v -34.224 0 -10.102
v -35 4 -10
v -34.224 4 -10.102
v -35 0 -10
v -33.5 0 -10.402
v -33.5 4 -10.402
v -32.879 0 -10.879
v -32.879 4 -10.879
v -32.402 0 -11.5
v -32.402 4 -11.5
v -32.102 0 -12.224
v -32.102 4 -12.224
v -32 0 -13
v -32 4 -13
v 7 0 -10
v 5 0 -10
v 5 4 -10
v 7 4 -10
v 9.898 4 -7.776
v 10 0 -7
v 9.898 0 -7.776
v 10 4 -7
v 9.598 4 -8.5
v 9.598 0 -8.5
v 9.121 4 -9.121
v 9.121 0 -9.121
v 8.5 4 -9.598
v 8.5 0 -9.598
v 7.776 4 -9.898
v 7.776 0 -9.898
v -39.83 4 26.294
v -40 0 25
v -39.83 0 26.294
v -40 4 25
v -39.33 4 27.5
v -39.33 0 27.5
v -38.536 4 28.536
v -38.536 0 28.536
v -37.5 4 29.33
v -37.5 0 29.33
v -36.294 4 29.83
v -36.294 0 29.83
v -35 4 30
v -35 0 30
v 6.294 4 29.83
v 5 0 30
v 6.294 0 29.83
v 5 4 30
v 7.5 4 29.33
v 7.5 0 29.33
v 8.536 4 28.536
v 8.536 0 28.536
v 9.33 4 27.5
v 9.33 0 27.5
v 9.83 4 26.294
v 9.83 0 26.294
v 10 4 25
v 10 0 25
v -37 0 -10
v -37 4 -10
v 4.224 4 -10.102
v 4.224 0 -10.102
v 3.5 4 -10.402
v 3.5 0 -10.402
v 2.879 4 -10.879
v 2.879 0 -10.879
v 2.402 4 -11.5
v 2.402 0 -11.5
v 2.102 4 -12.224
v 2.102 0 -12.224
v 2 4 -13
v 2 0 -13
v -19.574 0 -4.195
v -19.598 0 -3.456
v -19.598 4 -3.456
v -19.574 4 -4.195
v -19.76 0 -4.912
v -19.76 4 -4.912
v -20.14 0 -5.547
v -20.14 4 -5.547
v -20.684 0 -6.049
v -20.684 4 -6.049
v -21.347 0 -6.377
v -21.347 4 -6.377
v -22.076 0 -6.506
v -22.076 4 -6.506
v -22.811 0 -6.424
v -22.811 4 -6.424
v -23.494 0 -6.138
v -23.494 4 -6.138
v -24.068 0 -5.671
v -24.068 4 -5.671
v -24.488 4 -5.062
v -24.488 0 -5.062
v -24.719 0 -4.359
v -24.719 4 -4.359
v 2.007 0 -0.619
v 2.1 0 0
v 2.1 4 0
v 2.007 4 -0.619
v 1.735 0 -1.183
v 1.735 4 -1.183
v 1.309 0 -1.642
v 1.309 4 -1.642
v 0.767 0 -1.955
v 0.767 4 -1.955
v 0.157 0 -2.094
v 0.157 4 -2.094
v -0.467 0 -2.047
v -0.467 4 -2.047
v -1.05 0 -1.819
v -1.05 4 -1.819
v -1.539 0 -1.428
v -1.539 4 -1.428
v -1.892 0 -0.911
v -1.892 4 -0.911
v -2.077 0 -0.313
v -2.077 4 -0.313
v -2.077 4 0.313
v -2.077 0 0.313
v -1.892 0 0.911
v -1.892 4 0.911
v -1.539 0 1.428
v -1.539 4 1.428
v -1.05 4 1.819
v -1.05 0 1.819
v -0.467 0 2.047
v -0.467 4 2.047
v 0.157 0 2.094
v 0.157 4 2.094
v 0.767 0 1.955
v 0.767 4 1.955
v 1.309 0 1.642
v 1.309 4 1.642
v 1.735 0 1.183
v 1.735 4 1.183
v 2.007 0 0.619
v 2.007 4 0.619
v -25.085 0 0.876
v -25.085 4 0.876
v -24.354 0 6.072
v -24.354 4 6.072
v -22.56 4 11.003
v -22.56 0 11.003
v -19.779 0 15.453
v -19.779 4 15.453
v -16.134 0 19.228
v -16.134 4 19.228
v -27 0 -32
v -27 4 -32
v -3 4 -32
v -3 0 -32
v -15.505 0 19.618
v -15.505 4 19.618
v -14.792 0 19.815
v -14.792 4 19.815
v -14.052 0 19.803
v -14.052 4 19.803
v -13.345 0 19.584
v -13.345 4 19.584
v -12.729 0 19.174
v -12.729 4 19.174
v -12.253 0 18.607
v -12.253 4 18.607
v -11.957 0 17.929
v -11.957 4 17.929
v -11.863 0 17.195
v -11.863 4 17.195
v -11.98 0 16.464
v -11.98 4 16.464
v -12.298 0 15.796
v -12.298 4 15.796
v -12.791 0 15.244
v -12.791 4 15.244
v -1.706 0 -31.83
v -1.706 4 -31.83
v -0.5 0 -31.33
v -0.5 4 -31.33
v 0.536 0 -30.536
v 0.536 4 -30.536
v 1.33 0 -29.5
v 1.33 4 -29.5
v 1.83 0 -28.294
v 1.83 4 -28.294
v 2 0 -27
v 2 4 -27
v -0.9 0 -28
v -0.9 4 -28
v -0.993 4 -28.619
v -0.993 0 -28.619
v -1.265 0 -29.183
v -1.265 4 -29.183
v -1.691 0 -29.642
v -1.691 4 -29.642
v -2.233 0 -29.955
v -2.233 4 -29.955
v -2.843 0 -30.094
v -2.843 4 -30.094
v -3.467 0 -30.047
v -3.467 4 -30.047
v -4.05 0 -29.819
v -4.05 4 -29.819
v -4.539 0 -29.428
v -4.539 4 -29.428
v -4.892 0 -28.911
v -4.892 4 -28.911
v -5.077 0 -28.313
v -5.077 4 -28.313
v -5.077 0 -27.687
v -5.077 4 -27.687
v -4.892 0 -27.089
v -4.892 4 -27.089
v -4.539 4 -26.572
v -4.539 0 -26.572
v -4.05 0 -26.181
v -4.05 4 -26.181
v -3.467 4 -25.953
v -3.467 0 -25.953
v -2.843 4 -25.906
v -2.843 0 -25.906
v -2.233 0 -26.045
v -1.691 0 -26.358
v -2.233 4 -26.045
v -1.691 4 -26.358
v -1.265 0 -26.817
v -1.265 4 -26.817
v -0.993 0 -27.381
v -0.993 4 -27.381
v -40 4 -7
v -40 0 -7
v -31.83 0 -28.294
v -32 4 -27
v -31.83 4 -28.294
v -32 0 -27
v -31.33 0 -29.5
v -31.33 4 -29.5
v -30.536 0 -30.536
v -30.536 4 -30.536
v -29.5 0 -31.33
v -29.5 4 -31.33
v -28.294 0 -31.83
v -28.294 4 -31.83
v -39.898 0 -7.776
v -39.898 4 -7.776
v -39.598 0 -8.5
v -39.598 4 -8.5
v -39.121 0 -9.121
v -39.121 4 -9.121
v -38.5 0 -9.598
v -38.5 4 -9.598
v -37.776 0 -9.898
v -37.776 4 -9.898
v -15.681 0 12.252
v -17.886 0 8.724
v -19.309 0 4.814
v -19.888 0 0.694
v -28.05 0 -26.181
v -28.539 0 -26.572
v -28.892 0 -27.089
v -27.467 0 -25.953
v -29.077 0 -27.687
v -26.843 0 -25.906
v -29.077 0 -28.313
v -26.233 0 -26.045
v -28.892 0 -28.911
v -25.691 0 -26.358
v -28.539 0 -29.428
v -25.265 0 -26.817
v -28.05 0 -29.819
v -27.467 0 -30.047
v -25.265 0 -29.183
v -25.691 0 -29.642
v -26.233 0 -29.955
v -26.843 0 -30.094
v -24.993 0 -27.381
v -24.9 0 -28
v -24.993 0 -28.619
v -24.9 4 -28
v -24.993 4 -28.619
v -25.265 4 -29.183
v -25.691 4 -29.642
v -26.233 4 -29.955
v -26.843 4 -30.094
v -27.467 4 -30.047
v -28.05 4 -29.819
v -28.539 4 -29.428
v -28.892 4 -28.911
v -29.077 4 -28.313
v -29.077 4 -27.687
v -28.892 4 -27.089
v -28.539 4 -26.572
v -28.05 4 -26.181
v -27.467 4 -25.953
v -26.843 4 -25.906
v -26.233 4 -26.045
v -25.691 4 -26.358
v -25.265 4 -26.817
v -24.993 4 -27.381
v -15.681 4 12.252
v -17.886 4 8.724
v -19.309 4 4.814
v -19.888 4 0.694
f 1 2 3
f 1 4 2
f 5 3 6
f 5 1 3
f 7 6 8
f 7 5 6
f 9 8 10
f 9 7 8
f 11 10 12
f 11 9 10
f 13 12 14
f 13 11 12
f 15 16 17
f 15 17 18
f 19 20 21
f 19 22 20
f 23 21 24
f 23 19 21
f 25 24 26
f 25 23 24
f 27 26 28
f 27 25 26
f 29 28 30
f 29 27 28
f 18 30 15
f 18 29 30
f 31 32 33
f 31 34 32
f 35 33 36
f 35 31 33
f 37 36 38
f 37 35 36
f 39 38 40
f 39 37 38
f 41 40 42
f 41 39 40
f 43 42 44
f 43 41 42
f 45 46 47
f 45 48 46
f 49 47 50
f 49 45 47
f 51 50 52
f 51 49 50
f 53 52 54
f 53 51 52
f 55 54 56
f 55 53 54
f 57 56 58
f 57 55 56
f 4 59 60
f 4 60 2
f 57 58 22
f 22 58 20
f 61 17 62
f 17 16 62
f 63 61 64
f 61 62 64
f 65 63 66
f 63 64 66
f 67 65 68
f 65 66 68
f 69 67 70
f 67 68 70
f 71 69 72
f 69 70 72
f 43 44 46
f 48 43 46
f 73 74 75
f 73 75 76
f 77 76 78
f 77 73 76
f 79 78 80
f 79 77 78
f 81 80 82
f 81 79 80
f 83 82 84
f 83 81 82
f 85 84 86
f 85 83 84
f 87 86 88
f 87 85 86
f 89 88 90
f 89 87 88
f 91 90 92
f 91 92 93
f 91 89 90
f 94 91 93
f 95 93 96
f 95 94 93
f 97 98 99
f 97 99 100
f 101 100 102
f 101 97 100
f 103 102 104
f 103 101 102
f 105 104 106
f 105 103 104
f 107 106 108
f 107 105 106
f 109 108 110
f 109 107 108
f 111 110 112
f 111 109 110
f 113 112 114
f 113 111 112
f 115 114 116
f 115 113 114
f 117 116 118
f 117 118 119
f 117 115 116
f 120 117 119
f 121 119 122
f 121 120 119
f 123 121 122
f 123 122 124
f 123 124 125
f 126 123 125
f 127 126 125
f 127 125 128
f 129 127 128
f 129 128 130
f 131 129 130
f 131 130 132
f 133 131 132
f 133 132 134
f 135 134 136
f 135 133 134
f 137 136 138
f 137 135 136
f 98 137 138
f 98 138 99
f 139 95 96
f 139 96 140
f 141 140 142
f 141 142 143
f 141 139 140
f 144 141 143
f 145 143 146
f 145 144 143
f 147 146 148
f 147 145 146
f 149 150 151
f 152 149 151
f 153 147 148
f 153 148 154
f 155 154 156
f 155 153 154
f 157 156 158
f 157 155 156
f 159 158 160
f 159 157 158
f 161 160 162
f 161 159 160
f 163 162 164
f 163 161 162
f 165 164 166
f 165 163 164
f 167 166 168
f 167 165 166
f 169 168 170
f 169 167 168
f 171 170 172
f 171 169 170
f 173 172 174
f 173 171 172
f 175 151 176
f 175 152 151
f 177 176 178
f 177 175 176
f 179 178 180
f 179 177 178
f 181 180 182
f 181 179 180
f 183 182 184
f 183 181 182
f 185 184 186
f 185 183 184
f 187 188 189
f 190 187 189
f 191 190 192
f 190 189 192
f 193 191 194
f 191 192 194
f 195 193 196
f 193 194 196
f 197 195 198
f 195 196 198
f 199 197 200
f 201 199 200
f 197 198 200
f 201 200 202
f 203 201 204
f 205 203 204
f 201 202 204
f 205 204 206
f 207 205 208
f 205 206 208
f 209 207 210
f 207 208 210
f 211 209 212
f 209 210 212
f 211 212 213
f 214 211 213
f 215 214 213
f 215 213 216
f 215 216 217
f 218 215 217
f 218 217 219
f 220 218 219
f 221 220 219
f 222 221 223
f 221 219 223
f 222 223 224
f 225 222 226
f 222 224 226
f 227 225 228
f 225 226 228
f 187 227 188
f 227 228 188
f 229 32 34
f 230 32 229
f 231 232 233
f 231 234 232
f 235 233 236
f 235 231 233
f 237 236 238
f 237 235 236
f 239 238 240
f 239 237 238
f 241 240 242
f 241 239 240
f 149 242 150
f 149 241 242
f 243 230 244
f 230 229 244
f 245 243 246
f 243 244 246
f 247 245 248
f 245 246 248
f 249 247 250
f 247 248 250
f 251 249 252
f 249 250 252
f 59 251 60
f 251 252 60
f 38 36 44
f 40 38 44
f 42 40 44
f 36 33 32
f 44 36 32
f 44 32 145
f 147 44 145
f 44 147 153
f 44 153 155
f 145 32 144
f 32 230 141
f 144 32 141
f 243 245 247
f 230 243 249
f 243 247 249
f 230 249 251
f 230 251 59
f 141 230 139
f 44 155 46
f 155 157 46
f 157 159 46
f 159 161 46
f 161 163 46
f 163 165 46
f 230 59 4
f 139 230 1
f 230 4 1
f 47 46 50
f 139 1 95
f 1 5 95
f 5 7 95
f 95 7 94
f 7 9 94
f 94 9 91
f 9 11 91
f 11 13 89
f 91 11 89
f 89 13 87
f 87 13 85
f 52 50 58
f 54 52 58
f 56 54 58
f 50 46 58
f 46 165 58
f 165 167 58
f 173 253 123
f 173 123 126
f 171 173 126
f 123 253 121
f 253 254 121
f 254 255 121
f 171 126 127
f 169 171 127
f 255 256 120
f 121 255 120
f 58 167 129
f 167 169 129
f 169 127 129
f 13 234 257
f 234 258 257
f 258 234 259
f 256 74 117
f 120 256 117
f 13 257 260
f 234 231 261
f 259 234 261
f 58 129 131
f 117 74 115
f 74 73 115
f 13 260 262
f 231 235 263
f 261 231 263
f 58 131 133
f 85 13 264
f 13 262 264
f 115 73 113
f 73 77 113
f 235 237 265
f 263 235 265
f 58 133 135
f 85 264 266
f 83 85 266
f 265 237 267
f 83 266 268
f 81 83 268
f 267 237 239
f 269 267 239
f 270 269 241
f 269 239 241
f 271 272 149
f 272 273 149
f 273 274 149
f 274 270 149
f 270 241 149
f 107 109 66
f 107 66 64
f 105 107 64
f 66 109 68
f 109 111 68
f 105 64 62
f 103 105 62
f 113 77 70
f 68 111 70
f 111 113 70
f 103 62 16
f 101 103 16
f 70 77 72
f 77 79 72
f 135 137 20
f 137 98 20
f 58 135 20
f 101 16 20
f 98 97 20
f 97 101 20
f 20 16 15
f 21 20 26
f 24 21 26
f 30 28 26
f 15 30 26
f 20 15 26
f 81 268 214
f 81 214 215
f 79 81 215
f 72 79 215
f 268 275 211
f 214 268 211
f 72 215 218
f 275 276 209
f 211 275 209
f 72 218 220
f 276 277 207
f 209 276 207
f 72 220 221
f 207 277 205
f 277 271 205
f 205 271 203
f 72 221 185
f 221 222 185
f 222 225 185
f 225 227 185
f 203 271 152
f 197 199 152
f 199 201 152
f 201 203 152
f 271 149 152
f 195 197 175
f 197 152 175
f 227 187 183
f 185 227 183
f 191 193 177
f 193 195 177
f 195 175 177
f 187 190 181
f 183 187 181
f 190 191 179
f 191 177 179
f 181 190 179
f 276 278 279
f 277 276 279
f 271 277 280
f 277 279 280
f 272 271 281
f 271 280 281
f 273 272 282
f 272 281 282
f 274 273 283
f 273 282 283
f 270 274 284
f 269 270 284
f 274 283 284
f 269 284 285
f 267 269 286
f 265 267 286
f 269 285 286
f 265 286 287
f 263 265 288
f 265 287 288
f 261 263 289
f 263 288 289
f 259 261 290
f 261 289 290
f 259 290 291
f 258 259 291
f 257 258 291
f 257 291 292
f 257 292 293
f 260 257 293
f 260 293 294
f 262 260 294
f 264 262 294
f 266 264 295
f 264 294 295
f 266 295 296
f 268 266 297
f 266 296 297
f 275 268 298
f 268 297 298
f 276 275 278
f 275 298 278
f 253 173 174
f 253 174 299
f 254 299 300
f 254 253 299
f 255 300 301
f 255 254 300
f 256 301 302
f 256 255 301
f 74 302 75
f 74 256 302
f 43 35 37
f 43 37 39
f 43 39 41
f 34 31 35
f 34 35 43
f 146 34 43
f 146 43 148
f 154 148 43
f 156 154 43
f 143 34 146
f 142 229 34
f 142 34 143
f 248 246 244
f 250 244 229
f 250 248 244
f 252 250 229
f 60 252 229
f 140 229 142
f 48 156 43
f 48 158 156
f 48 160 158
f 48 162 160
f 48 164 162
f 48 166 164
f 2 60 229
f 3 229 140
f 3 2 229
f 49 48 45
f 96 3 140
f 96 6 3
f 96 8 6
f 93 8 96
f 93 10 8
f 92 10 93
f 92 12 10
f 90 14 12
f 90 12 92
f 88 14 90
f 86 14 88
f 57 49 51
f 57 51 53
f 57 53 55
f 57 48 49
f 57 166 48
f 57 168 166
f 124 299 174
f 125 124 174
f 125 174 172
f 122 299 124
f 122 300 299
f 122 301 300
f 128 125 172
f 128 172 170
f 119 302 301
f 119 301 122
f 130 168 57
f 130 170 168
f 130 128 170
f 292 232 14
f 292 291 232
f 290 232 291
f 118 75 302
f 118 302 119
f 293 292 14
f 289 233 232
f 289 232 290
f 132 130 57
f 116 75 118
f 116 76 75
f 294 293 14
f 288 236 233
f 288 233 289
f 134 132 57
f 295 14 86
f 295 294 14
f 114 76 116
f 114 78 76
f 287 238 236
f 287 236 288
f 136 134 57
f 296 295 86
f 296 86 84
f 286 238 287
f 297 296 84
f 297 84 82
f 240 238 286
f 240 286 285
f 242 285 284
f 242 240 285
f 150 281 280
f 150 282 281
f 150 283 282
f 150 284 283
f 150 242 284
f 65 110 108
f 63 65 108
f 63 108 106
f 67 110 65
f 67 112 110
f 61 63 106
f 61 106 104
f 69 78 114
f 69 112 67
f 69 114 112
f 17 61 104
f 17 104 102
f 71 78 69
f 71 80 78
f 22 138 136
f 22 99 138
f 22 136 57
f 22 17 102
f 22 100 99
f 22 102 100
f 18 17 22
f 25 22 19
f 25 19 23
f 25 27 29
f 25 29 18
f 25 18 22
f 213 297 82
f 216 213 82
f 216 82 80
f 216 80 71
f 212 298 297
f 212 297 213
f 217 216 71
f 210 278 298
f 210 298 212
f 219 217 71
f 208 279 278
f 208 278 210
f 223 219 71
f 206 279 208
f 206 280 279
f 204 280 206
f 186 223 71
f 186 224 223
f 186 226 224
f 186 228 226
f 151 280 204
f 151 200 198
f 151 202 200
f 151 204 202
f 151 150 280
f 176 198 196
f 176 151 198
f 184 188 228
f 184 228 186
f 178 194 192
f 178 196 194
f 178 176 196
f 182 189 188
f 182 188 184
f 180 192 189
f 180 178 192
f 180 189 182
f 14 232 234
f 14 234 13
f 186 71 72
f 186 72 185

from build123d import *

# Parameters (mm, degrees)
SKETCH_1_W         = 50
SKETCH_1_H         = 40
SKETCH_1_R         = 2.1
EXTRUDE_590_DEPTH  = 4
SKETCH_2_W         = 34
SKETCH_2_H         = 14
SKETCH_2_H_2       = 8
SKETCH_2_R         = 2.1
EXTRUDE_1234_DEPTH = 4
FILLET_3_R         = 3
FILLET_5_R         = 5


with BuildPart() as part:
    # 草图1 → Extrude 590 (new body)
    with BuildSketch(Plane(origin=(0, 0, 0), x_dir=(1, 0, 0), z_dir=(0, 1, 0))):
        with Locations((-15, -10)):
            Rectangle(SKETCH_1_W, SKETCH_1_H)
        Circle(SKETCH_1_R, mode=Mode.SUBTRACT)
        with BuildLine():
            ThreePointArc((-24.718674601, 4.358569259), (-23.586284782, -8.584705597), (-16.133969003, -19.227715522))
            ThreePointArc((-16.133969003, -19.227715522), (-12.471005666, -18.907247755), (-12.791473433, -15.244284418))
            ThreePointArc((-12.791473433, -15.244284418), (-18.699883154, -6.806200852), (-19.597674285, 3.455598736))
            ThreePointArc((-19.597674285, 3.455598736), (-21.706689181, 6.467584155), (-24.718674601, 4.358569259))
        make_face(mode=Mode.SUBTRACT)
    extrude(amount=EXTRUDE_590_DEPTH)

    # 草图2 → Extrude 1234 (add, through all)
    with BuildSketch(Plane(origin=(0, 4, 0), x_dir=(1, 0, 0), z_dir=(0, 1, 0))):
        with Locations((-15, 17)):
            Rectangle(SKETCH_2_W, SKETCH_2_H)
        with Locations((-15, 28)):
            Rectangle(SKETCH_2_W, SKETCH_2_H_2)
        with Locations((-3, 28)):
            Circle(SKETCH_2_R, mode=Mode.SUBTRACT)
        with Locations((-27, 28)):
            Circle(SKETCH_2_R, mode=Mode.SUBTRACT)
    extrude(amount=-EXTRUDE_1234_DEPTH)

    # 圆角3
    fillet_3_edges = [part.edges().sort_by_distance(p)[0] for p in [
        (2, 2, -10),
        (-32, 2, -10),
        (-40, 2, -10),
        (10, 2, -10),
    ]]
    fillet(fillet_3_edges, radius=FILLET_3_R)

    # 圆角5
    fillet_5_edges = [part.edges().sort_by_distance(p)[0] for p in [
        (2, 2, -32),
        (-32, 2, -32),
        (10, 2, 30),
        (-40, 2, 30),
    ]]
    fillet(fillet_5_edges, radius=FILLET_5_R)


solid = part.part
